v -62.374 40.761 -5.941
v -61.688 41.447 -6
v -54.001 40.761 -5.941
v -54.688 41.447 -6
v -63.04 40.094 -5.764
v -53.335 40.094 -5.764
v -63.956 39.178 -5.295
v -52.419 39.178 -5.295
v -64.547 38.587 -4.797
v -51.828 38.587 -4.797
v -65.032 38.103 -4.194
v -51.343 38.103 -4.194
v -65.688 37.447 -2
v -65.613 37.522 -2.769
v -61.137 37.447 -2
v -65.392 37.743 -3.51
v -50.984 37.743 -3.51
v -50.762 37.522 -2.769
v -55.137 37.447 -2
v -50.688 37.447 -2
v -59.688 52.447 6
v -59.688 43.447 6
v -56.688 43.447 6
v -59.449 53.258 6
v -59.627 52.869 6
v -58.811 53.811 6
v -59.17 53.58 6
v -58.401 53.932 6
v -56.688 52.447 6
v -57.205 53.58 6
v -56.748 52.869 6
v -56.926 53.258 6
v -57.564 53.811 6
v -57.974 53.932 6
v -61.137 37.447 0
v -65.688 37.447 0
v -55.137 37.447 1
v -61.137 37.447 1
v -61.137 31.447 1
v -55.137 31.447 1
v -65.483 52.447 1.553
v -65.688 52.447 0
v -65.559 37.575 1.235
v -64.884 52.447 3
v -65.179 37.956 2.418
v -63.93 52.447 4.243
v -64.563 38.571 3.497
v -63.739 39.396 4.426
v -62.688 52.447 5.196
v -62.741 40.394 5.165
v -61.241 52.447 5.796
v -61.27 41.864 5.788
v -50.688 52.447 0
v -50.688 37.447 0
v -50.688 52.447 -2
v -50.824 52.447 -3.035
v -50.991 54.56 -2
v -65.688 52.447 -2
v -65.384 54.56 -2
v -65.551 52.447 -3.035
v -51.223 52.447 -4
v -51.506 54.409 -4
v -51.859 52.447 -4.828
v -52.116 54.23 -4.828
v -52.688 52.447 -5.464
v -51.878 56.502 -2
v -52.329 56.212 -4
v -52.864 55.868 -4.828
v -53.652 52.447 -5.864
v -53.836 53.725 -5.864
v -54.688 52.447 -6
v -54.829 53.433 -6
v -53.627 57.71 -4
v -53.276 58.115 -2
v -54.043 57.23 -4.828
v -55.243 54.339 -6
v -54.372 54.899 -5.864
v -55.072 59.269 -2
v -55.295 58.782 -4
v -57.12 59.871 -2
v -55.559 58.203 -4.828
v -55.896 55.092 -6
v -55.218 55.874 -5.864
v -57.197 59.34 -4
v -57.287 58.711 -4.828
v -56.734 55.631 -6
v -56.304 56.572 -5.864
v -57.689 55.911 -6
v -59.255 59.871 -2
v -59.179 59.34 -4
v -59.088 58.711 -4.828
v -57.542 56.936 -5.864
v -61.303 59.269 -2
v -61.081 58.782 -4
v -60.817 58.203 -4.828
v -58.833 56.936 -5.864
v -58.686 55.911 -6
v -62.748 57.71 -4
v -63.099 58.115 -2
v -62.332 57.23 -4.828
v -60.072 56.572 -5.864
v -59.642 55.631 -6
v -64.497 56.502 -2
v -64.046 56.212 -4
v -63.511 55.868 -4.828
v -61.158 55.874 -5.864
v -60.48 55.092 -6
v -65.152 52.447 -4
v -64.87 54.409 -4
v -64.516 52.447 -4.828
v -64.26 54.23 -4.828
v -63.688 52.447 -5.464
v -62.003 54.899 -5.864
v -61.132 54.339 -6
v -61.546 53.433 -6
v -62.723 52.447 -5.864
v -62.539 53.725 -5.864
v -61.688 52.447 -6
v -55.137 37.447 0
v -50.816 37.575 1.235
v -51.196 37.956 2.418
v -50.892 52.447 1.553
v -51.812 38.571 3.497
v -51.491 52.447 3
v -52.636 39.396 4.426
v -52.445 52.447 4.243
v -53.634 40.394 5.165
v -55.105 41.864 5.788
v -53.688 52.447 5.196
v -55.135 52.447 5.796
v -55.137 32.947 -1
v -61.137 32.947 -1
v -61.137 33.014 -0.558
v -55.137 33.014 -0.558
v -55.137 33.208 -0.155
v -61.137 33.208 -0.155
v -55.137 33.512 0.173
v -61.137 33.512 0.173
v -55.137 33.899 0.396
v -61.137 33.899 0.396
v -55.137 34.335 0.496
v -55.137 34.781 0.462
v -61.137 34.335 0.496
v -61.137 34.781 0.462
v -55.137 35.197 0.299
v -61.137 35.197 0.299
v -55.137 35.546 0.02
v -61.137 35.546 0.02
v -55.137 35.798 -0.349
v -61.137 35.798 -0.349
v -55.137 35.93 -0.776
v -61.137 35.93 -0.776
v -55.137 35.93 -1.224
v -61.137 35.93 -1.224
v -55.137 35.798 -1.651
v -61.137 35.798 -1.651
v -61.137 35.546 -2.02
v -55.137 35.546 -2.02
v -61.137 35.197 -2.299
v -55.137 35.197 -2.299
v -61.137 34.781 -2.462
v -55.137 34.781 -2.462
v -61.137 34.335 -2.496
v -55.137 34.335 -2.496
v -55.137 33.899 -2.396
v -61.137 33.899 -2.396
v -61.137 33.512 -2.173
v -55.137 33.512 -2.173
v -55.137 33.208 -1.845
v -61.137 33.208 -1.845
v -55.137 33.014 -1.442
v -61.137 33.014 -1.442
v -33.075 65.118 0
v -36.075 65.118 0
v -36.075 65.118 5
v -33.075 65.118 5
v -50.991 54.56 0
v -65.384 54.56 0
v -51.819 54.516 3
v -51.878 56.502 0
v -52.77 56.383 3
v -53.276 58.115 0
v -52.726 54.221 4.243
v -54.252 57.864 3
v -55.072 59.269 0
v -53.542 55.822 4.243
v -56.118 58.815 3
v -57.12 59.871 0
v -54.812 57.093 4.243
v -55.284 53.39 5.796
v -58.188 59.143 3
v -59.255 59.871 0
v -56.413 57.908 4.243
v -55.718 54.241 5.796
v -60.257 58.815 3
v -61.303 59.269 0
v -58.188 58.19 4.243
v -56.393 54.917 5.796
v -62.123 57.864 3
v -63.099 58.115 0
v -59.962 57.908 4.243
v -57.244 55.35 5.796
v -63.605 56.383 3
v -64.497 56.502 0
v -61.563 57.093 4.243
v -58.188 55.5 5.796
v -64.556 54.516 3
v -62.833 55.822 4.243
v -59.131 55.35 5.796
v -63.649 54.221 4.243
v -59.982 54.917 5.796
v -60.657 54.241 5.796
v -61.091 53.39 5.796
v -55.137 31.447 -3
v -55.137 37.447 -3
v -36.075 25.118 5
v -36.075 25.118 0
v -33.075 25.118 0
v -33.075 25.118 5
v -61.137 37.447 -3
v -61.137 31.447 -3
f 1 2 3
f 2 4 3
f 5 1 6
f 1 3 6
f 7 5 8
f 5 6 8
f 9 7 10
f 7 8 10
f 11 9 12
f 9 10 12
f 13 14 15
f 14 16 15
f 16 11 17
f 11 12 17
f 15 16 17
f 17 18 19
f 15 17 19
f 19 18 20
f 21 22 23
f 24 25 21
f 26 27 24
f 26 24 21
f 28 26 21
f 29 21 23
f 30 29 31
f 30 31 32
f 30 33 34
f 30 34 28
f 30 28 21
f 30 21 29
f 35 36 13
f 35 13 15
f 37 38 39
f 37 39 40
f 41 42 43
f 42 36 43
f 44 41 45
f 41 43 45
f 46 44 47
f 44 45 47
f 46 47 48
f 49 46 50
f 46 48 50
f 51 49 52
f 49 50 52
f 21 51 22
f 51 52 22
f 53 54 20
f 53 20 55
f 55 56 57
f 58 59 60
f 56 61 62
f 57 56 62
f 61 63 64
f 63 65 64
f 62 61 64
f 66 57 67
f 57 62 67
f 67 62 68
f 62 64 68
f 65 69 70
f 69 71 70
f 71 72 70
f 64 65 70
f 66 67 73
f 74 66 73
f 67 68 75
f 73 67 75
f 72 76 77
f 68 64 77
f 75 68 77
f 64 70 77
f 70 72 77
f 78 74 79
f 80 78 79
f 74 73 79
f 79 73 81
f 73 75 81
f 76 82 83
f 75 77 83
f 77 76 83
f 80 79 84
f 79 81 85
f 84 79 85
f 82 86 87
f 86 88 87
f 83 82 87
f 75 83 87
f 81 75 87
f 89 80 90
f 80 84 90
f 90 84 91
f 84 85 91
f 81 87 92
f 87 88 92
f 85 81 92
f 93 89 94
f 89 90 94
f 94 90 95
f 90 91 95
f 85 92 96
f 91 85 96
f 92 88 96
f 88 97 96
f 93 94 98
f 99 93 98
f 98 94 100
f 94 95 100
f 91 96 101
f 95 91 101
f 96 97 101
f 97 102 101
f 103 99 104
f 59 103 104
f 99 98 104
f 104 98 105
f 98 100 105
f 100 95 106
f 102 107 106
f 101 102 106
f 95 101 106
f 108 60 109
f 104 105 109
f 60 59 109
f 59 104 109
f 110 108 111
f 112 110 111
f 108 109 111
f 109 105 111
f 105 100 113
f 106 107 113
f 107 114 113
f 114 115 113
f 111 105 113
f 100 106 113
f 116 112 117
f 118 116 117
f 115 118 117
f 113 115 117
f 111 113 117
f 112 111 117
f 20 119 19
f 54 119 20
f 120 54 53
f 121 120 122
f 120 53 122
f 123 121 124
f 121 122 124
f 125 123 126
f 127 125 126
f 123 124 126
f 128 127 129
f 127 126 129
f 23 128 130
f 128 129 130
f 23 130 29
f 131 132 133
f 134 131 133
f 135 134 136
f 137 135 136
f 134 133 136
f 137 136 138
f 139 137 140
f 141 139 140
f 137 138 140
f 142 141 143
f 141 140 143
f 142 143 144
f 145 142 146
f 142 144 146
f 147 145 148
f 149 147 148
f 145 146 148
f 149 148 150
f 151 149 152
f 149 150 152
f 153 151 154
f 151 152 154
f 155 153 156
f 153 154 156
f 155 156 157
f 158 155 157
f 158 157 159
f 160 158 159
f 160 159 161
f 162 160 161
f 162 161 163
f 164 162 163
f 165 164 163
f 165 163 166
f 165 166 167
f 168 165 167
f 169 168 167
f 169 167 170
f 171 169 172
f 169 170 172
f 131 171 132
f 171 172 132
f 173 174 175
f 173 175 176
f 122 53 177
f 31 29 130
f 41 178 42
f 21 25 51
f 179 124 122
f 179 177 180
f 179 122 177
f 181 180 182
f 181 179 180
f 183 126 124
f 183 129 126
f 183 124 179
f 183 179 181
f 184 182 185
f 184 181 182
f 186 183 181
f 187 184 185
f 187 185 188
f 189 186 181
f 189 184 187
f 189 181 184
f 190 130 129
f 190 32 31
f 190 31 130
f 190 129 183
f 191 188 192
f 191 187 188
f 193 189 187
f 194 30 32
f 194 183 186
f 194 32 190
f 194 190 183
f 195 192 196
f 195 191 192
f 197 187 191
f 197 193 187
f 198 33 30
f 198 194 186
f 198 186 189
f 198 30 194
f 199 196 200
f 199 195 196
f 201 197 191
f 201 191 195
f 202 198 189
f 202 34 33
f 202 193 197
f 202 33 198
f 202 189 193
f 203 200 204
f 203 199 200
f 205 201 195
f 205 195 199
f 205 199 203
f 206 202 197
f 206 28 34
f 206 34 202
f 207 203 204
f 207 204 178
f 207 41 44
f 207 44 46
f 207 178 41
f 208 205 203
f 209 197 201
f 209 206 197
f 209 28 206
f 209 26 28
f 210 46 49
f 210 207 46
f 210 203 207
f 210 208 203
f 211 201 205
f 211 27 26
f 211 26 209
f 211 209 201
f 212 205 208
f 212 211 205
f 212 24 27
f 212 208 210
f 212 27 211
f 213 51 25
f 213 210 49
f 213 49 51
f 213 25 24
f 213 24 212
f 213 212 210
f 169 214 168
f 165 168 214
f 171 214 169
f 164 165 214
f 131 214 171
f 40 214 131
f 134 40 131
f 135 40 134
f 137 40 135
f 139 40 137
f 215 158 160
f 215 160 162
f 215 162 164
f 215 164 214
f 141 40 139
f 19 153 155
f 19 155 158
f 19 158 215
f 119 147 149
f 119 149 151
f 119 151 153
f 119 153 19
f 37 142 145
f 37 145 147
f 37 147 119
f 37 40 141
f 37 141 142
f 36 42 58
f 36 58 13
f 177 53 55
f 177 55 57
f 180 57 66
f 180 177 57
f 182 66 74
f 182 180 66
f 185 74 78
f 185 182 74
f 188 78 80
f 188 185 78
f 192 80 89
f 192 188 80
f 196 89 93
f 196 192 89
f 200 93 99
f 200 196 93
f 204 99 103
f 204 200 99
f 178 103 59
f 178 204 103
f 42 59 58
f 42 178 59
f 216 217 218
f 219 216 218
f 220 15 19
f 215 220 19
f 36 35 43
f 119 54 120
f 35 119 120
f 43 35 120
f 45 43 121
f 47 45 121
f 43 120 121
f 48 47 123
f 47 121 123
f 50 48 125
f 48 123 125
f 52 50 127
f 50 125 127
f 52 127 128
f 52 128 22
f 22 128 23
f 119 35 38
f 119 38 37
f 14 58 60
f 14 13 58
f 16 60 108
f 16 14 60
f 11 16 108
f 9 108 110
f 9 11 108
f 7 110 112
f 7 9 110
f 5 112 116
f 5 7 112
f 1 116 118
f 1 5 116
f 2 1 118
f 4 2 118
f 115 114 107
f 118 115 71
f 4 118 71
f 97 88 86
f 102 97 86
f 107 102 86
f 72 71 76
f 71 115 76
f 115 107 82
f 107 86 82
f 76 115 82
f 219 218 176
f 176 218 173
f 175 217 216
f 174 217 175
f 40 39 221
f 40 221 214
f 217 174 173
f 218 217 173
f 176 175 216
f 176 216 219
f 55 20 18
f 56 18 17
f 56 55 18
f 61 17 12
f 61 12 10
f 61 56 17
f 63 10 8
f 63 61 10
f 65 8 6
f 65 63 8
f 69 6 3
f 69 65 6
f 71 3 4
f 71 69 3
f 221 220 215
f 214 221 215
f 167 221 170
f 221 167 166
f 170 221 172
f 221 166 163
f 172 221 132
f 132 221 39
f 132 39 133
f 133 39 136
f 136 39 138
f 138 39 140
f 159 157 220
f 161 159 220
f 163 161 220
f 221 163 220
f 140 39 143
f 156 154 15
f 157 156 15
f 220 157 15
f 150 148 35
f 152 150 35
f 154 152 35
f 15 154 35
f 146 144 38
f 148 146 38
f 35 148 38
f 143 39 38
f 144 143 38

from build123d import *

# Parameters (mm, degrees)
F1_DEPTH      = 6
F2_R          = 6
F3_R          = 4
F4_W          = 6
F4_H          = 6
F5_DEPTH      = 1
F5_DEPTH_BACK = 3
F6_R          = 1.5
F7_DEPTH      = 6
F8_W          = 3
F8_H          = 40
F9_DEPTH      = 5


with BuildPart() as f1:
    # F0 (on Top) → F1 (new body, symmetric)
    with BuildSketch(Plane.XY):
        with BuildLine():
            ThreePointArc((-65.6875988848, 52.4468704985), (-58.1875988848, 44.9468704985), (-50.6875988848, 52.4468704985))
            ThreePointArc((-50.6875988848, 52.4468704985), (-58.1875988848, 59.9468704985), (-65.6875988848, 52.4468704985))
        make_face()
        with BuildLine():
            Line((-50.6875988848, 37.4468704985), (-50.6875988848, 52.4468704985))
            ThreePointArc((-50.6875988848, 52.4468704985), (-58.1875988848, 44.9468704985), (-65.6875988848, 52.4468704985))
            Line((-65.6875988848, 52.4468704985), (-65.6875988848, 37.4468704985))
            Line((-65.6875988848, 37.4468704985), (-61.1875988848, 37.4468704985))
            Line((-61.1875988848, 37.4468704985), (-55.1875988848, 37.4468704985))
            Line((-55.1875988848, 37.4468704985), (-50.6875988848, 37.4468704985))
        make_face()
    extrude(amount=F1_DEPTH, both=True)

    # F2
    f2_edges = [f1.edges().sort_by_distance(p)[0] for p in [
        (-58.187599, 59.94687, 6),
        (-65.687599, 44.94687, 6),
        (-58.187599, 37.44687, 6),
        (-50.687599, 44.94687, 6),
    ]]
    fillet(f2_edges, radius=F2_R)

    # F3
    f3_edges = [f1.edges().sort_by_distance(p)[0] for p in [
        (-58.187599, 59.94687, -6),
        (-65.687599, 44.94687, -6),
        (-58.187599, 37.44687, -6),
        (-50.687599, 44.94687, -6),
    ]]
    fillet(f3_edges, radius=F3_R)

    # F4 (on Top) → F5 (join, two sides)
    with BuildSketch(Plane.XY) as f5_sk:
        with Locations((-58.1369646636, 34.4468704985)):
            Rectangle(F4_W, F4_H)
    extrude(amount=F5_DEPTH)
    extrude(f5_sk.sketch, amount=-F5_DEPTH_BACK)

    # F6 (on face) → F7 (cut)
    with BuildSketch(Plane(origin=(-61.1369646636, 0, 0), x_dir=(0, -1, 0), z_dir=(-1, 0, 0))):
        with Locations((-34.4468704985, -1)):
            Circle(F6_R)
    extrude(amount=-F7_DEPTH, mode=Mode.SUBTRACT)


with BuildPart() as f9:
    # F8 (on Top) → F9 (new body)
    with BuildSketch(Plane.XY):
        with Locations((-34.5753123189, 45.1175575703)):
            Rectangle(F8_W, F8_H)
    extrude(amount=F9_DEPTH)


solid = Compound([f1.part, f9.part])
